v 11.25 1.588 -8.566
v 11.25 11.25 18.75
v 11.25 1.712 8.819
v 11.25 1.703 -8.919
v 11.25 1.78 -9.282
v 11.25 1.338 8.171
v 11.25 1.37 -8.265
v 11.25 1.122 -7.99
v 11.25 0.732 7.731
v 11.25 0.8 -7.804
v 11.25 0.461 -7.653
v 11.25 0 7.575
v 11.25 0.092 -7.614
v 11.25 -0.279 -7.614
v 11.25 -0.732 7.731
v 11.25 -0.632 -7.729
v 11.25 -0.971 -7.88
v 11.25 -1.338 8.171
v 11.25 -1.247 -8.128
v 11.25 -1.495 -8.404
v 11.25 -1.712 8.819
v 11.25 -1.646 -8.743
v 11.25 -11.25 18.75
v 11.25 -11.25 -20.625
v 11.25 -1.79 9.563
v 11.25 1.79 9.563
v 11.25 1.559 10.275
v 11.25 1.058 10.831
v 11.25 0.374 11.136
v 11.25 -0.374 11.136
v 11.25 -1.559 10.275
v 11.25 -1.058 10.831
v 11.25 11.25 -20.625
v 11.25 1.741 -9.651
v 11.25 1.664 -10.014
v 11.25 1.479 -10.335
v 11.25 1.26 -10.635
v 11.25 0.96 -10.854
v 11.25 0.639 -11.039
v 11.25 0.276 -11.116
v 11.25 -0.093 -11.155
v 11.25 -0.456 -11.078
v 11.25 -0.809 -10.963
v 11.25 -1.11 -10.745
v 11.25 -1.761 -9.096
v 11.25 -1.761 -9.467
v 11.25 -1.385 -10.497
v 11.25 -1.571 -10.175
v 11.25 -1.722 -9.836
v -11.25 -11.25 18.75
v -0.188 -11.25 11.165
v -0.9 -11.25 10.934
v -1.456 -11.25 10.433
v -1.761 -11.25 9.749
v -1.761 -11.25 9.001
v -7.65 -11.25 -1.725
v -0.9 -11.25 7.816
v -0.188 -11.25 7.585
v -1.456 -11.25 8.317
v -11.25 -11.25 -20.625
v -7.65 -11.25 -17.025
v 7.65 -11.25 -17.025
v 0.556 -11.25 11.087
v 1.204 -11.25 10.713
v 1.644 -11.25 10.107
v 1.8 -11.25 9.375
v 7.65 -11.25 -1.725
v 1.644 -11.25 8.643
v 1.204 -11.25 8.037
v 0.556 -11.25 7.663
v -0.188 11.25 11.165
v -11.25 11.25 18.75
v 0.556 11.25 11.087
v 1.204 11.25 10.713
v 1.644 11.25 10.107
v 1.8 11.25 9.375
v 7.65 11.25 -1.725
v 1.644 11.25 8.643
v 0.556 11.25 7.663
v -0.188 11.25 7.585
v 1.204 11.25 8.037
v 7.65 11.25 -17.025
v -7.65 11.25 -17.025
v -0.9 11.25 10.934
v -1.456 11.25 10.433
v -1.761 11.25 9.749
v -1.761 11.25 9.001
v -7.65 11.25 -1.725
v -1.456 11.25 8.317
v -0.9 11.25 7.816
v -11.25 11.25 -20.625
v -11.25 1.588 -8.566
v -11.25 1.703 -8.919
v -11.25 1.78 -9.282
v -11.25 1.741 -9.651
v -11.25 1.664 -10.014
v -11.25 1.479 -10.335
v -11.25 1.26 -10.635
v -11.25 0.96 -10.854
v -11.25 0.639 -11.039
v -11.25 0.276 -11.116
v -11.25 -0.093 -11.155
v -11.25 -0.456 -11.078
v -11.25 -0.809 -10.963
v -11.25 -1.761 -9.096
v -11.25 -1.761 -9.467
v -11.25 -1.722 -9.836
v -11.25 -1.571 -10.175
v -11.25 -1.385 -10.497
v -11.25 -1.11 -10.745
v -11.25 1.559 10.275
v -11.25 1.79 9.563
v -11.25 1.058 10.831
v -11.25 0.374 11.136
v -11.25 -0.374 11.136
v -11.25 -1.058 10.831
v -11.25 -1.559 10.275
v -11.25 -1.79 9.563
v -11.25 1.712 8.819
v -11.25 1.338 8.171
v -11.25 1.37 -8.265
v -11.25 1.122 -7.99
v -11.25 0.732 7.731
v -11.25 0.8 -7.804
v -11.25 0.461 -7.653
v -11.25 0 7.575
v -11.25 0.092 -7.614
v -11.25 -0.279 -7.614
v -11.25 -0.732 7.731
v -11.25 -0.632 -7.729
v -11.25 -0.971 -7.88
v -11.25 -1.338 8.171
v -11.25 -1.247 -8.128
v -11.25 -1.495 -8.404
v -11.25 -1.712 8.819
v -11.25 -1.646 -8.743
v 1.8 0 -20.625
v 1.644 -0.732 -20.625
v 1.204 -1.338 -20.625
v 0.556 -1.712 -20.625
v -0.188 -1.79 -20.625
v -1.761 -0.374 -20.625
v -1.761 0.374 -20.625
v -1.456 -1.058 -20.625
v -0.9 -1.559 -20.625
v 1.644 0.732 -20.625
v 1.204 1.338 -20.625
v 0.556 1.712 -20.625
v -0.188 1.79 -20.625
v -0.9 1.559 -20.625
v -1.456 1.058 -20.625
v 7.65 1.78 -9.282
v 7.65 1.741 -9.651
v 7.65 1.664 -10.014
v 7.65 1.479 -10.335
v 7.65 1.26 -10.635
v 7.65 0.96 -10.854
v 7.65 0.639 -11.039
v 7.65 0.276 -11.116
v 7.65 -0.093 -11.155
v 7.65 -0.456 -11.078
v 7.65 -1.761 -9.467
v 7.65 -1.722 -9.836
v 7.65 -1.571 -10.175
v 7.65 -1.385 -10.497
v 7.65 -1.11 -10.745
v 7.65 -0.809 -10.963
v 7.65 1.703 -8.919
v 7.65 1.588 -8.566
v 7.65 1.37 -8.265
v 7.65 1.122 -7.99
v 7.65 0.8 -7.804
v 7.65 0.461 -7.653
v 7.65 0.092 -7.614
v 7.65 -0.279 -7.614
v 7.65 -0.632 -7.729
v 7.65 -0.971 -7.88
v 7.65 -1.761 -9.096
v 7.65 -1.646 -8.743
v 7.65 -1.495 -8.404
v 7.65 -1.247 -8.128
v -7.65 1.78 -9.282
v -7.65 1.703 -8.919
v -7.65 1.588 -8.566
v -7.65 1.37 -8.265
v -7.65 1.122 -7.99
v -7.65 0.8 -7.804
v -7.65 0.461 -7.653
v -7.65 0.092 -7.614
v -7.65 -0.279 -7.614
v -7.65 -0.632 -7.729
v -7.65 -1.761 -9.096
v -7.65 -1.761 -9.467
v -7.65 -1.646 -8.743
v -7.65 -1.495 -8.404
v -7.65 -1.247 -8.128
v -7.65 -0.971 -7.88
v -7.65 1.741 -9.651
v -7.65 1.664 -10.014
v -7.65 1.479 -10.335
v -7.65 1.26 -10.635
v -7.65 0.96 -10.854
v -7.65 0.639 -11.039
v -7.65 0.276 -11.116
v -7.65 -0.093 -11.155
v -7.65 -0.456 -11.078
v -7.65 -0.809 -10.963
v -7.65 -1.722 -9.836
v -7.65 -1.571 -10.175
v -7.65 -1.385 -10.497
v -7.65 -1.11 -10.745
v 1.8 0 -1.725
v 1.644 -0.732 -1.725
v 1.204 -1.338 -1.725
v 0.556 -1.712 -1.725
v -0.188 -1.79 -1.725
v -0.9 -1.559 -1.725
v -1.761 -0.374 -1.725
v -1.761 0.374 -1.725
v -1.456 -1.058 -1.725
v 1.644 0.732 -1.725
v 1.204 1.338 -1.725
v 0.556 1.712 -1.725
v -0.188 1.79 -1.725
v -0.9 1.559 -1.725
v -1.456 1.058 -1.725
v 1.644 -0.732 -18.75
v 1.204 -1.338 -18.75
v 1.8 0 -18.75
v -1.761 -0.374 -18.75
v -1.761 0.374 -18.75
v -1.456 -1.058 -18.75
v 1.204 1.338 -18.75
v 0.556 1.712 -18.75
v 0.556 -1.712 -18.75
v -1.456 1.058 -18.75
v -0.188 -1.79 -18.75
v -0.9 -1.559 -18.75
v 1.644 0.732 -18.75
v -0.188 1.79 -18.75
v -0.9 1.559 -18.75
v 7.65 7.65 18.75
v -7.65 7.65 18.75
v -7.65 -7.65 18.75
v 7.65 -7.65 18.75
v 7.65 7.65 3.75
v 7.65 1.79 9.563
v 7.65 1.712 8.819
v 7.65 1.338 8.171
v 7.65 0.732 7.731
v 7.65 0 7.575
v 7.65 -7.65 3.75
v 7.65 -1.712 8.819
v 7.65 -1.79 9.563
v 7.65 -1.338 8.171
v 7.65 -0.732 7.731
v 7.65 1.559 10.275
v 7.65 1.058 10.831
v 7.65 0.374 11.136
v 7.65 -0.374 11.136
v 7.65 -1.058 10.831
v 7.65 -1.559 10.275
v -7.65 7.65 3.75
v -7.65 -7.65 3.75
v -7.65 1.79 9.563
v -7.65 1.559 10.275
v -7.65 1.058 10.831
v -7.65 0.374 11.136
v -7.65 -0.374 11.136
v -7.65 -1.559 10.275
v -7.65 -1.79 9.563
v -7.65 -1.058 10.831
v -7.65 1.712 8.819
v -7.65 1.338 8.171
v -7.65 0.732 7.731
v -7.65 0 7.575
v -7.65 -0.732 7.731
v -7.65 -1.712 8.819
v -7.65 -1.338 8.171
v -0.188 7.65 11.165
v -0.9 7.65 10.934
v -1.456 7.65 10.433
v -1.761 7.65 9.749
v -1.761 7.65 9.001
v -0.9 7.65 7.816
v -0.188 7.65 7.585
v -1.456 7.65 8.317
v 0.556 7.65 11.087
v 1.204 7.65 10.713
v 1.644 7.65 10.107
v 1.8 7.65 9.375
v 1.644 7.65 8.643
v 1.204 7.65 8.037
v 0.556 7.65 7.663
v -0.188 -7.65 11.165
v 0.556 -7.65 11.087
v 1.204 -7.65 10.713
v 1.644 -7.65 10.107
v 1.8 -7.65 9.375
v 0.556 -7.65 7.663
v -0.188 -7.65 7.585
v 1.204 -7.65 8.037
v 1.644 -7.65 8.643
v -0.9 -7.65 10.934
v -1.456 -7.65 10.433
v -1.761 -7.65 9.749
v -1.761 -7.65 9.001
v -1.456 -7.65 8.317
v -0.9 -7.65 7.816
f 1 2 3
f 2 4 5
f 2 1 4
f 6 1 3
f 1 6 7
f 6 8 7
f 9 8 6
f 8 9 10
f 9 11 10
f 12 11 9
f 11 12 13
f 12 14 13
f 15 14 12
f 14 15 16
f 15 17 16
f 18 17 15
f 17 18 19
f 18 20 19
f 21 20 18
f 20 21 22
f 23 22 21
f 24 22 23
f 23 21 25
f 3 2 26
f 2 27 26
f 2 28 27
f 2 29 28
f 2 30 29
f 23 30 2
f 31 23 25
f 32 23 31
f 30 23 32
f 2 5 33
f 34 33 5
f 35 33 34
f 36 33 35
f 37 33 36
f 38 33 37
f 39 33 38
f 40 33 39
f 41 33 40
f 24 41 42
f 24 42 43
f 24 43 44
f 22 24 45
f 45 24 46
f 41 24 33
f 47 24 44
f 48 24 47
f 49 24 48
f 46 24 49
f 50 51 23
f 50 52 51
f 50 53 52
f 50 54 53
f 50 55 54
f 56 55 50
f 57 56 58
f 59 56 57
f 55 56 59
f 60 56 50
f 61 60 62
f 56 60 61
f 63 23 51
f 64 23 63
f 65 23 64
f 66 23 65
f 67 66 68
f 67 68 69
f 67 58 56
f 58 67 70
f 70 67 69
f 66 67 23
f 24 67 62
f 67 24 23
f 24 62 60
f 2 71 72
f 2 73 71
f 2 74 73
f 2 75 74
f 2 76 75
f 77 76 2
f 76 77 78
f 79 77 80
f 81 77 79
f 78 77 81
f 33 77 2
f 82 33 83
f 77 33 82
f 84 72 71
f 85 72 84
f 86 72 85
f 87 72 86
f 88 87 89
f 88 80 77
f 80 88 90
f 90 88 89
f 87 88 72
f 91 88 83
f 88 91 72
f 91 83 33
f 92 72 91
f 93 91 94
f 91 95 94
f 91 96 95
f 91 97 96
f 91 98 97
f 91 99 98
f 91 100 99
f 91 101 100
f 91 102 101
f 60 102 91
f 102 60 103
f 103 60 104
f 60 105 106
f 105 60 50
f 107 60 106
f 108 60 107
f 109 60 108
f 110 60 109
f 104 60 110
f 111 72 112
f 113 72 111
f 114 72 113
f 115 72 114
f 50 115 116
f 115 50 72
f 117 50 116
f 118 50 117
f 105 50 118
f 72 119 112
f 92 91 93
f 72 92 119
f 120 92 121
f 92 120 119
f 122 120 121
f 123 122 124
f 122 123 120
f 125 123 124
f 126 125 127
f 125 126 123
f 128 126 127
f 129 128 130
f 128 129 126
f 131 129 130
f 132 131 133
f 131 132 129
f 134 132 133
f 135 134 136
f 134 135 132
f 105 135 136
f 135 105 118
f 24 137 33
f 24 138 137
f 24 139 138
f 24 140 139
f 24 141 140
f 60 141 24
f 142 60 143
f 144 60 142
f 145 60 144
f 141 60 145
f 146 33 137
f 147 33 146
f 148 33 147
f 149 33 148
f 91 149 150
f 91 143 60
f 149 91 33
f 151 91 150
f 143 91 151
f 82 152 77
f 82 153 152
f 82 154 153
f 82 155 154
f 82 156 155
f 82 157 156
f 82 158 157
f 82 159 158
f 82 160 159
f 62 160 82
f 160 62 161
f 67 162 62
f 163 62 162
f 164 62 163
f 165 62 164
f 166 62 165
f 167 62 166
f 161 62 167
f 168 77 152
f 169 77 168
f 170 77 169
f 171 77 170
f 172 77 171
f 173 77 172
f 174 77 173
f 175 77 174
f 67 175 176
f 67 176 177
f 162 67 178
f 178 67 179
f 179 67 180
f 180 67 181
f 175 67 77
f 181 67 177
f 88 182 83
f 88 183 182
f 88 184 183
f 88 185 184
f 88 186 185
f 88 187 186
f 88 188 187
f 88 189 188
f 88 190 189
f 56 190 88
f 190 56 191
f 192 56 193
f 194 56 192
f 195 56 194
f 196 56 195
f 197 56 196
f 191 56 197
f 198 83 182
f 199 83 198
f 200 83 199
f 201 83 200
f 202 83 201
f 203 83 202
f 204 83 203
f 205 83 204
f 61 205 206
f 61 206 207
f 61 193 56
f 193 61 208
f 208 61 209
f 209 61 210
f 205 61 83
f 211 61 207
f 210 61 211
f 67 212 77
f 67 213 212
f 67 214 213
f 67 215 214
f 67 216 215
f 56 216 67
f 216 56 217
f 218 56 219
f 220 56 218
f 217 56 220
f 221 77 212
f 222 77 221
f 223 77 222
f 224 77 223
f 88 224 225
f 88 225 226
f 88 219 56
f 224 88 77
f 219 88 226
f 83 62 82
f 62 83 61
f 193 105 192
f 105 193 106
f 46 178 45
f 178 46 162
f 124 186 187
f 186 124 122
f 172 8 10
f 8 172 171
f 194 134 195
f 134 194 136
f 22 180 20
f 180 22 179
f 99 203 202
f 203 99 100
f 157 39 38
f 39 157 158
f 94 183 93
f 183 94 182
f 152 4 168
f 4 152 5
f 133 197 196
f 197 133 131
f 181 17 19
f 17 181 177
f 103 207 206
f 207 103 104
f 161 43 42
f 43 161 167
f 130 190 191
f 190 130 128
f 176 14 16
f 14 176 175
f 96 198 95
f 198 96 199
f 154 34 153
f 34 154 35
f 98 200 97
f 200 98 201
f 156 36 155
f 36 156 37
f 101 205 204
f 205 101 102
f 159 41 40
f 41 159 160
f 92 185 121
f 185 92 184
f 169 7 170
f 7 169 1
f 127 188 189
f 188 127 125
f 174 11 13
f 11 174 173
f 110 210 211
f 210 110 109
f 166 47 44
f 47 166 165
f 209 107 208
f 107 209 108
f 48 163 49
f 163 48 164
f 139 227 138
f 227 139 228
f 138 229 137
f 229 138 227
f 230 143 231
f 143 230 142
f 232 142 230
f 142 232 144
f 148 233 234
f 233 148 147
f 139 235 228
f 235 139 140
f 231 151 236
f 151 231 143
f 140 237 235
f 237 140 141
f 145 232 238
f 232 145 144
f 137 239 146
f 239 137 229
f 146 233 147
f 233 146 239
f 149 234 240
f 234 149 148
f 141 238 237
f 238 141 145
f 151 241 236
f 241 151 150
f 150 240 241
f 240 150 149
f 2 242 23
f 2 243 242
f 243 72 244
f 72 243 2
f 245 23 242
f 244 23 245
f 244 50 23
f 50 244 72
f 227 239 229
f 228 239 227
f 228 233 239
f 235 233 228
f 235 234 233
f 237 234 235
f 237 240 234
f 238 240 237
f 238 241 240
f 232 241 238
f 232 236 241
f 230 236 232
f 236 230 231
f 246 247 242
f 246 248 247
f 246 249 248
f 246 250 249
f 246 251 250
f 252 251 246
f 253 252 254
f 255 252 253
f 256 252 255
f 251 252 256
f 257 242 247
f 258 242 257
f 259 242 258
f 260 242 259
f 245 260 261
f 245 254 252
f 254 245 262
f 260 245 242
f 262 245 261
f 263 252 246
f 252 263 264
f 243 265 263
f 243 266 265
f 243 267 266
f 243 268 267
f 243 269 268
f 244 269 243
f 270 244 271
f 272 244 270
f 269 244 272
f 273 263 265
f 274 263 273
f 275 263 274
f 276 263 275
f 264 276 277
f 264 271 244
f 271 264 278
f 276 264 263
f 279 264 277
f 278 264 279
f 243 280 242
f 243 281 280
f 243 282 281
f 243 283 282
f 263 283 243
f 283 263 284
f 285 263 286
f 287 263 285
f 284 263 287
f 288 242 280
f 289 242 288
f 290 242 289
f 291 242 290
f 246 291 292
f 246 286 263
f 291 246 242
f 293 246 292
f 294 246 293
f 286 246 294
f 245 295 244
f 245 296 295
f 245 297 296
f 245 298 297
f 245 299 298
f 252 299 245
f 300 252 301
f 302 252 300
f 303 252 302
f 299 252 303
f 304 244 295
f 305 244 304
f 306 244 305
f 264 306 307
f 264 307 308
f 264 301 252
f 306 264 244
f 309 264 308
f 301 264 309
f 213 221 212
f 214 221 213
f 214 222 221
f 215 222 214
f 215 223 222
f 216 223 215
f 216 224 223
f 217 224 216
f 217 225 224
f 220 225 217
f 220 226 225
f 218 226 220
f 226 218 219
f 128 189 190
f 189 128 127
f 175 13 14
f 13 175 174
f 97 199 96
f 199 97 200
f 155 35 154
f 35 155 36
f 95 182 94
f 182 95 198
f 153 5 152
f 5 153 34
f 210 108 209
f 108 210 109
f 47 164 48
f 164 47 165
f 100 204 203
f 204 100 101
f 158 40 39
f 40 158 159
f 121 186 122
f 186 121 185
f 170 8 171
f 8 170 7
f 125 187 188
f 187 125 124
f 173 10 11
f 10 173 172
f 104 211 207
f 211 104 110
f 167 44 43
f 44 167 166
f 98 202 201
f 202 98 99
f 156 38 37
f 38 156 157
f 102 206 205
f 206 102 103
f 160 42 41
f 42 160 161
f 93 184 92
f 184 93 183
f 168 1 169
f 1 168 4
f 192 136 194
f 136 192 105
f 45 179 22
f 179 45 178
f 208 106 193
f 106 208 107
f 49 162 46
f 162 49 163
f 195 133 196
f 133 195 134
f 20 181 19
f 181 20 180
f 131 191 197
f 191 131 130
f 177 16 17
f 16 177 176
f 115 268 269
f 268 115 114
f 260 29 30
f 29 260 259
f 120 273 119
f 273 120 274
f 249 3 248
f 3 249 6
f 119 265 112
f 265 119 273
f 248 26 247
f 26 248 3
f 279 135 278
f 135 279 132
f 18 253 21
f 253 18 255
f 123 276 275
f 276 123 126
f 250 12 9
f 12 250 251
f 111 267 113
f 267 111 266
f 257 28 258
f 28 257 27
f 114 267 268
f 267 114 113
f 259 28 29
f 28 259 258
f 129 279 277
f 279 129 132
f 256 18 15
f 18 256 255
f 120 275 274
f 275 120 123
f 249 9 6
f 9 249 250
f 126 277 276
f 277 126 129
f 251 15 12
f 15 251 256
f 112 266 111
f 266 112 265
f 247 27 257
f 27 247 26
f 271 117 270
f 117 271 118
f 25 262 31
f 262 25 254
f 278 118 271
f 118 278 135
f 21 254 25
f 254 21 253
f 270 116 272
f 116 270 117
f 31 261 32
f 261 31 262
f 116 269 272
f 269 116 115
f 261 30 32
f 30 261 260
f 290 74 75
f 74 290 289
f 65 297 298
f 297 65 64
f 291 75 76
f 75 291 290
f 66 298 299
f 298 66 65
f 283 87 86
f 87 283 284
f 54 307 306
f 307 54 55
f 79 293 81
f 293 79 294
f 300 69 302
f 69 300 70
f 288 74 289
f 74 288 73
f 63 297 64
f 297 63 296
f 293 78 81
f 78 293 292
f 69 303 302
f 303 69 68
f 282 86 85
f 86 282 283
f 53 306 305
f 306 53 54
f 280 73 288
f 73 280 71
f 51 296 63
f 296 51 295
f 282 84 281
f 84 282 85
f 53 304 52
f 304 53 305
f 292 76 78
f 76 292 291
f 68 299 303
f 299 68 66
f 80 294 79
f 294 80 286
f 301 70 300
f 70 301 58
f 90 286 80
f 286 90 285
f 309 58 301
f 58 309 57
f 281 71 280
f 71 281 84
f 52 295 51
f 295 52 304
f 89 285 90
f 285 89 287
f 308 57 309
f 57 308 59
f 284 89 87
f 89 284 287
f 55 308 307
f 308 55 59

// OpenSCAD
open_beam = 15; //open beam dimensions (square)
r_corners = 3;
extrusion=0.3;

w_t_mod = 0.5;
beam_width = 15;
slot_depth = 15;
cross_b_length = beam_width+beam_width*w_t_mod ;
//variables for edge fillet
b = 13;
h = 20;
w = 90*0.5888888+r_corners;


//===========================================================================================
//===========================================================================================
module beam_cap(){

	difference(){
		difference(){
			cube([beam_width+beam_width*w_t_mod, beam_width+beam_width*w_t_mod, slot_depth+beam_width*w_t_mod+beam_width], center=true);
			translate([0, 0, (beam_width*w_t_mod+beam_width)/2])
			cube([beam_width+extrusion, beam_width+extrusion, slot_depth], center=true);

		}
			union(){
				translate([0, 0, -(slot_depth+beam_width*w_t_mod+beam_width)/4])
				rotate([90, 0, 0])
				cube([beam_width+extrusion, beam_width+extrusion, cross_b_length*2], center=true);
				translate([0, 0, -(slot_depth+beam_width*w_t_mod+beam_width)/4])
				rotate([0, 90, 0])
				cylinder(r=1.5+extrusion, h=cross_b_length*2,center = true,  $fn=15);
				translate([0, 0, (slot_depth+beam_width*w_t_mod+beam_width)/4])
				rotate([0, 90, 0])
				cylinder(r=1.5+extrusion, h=cross_b_length*2,center = true,  $fn=15);
				translate([0, 0, (slot_depth+beam_width*w_t_mod+beam_width)/4])
				rotate([90, 0, 0])
				cylinder(r=1.5+extrusion, h=cross_b_length*2,center = true,  $fn=15);
			}
	}
}

module cross_beam(){
	difference(){
	difference(){
		cube([beam_width+beam_width*w_t_mod, beam_width+beam_width*w_t_mod, cross_b_length], center=true);
		cube([beam_width+extrusion, beam_width+extrusion, cross_b_length], center=true);

	}
	rotate([0, 90, 0])
	cylinder(r=1.5+extrusion, h=cross_b_length*2,center = true,  $fn=15);
	rotate([90, 0, 0])
	cylinder(r=1.5+extrusion, h=cross_b_length*2,center = true,  $fn=15);
	}

}
//cross_beam();

union(){
translate([0, 0, -(slot_depth+beam_width*w_t_mod+beam_width)/4])
rotate([90, 0, 0])
cross_beam();
beam_cap();
}
